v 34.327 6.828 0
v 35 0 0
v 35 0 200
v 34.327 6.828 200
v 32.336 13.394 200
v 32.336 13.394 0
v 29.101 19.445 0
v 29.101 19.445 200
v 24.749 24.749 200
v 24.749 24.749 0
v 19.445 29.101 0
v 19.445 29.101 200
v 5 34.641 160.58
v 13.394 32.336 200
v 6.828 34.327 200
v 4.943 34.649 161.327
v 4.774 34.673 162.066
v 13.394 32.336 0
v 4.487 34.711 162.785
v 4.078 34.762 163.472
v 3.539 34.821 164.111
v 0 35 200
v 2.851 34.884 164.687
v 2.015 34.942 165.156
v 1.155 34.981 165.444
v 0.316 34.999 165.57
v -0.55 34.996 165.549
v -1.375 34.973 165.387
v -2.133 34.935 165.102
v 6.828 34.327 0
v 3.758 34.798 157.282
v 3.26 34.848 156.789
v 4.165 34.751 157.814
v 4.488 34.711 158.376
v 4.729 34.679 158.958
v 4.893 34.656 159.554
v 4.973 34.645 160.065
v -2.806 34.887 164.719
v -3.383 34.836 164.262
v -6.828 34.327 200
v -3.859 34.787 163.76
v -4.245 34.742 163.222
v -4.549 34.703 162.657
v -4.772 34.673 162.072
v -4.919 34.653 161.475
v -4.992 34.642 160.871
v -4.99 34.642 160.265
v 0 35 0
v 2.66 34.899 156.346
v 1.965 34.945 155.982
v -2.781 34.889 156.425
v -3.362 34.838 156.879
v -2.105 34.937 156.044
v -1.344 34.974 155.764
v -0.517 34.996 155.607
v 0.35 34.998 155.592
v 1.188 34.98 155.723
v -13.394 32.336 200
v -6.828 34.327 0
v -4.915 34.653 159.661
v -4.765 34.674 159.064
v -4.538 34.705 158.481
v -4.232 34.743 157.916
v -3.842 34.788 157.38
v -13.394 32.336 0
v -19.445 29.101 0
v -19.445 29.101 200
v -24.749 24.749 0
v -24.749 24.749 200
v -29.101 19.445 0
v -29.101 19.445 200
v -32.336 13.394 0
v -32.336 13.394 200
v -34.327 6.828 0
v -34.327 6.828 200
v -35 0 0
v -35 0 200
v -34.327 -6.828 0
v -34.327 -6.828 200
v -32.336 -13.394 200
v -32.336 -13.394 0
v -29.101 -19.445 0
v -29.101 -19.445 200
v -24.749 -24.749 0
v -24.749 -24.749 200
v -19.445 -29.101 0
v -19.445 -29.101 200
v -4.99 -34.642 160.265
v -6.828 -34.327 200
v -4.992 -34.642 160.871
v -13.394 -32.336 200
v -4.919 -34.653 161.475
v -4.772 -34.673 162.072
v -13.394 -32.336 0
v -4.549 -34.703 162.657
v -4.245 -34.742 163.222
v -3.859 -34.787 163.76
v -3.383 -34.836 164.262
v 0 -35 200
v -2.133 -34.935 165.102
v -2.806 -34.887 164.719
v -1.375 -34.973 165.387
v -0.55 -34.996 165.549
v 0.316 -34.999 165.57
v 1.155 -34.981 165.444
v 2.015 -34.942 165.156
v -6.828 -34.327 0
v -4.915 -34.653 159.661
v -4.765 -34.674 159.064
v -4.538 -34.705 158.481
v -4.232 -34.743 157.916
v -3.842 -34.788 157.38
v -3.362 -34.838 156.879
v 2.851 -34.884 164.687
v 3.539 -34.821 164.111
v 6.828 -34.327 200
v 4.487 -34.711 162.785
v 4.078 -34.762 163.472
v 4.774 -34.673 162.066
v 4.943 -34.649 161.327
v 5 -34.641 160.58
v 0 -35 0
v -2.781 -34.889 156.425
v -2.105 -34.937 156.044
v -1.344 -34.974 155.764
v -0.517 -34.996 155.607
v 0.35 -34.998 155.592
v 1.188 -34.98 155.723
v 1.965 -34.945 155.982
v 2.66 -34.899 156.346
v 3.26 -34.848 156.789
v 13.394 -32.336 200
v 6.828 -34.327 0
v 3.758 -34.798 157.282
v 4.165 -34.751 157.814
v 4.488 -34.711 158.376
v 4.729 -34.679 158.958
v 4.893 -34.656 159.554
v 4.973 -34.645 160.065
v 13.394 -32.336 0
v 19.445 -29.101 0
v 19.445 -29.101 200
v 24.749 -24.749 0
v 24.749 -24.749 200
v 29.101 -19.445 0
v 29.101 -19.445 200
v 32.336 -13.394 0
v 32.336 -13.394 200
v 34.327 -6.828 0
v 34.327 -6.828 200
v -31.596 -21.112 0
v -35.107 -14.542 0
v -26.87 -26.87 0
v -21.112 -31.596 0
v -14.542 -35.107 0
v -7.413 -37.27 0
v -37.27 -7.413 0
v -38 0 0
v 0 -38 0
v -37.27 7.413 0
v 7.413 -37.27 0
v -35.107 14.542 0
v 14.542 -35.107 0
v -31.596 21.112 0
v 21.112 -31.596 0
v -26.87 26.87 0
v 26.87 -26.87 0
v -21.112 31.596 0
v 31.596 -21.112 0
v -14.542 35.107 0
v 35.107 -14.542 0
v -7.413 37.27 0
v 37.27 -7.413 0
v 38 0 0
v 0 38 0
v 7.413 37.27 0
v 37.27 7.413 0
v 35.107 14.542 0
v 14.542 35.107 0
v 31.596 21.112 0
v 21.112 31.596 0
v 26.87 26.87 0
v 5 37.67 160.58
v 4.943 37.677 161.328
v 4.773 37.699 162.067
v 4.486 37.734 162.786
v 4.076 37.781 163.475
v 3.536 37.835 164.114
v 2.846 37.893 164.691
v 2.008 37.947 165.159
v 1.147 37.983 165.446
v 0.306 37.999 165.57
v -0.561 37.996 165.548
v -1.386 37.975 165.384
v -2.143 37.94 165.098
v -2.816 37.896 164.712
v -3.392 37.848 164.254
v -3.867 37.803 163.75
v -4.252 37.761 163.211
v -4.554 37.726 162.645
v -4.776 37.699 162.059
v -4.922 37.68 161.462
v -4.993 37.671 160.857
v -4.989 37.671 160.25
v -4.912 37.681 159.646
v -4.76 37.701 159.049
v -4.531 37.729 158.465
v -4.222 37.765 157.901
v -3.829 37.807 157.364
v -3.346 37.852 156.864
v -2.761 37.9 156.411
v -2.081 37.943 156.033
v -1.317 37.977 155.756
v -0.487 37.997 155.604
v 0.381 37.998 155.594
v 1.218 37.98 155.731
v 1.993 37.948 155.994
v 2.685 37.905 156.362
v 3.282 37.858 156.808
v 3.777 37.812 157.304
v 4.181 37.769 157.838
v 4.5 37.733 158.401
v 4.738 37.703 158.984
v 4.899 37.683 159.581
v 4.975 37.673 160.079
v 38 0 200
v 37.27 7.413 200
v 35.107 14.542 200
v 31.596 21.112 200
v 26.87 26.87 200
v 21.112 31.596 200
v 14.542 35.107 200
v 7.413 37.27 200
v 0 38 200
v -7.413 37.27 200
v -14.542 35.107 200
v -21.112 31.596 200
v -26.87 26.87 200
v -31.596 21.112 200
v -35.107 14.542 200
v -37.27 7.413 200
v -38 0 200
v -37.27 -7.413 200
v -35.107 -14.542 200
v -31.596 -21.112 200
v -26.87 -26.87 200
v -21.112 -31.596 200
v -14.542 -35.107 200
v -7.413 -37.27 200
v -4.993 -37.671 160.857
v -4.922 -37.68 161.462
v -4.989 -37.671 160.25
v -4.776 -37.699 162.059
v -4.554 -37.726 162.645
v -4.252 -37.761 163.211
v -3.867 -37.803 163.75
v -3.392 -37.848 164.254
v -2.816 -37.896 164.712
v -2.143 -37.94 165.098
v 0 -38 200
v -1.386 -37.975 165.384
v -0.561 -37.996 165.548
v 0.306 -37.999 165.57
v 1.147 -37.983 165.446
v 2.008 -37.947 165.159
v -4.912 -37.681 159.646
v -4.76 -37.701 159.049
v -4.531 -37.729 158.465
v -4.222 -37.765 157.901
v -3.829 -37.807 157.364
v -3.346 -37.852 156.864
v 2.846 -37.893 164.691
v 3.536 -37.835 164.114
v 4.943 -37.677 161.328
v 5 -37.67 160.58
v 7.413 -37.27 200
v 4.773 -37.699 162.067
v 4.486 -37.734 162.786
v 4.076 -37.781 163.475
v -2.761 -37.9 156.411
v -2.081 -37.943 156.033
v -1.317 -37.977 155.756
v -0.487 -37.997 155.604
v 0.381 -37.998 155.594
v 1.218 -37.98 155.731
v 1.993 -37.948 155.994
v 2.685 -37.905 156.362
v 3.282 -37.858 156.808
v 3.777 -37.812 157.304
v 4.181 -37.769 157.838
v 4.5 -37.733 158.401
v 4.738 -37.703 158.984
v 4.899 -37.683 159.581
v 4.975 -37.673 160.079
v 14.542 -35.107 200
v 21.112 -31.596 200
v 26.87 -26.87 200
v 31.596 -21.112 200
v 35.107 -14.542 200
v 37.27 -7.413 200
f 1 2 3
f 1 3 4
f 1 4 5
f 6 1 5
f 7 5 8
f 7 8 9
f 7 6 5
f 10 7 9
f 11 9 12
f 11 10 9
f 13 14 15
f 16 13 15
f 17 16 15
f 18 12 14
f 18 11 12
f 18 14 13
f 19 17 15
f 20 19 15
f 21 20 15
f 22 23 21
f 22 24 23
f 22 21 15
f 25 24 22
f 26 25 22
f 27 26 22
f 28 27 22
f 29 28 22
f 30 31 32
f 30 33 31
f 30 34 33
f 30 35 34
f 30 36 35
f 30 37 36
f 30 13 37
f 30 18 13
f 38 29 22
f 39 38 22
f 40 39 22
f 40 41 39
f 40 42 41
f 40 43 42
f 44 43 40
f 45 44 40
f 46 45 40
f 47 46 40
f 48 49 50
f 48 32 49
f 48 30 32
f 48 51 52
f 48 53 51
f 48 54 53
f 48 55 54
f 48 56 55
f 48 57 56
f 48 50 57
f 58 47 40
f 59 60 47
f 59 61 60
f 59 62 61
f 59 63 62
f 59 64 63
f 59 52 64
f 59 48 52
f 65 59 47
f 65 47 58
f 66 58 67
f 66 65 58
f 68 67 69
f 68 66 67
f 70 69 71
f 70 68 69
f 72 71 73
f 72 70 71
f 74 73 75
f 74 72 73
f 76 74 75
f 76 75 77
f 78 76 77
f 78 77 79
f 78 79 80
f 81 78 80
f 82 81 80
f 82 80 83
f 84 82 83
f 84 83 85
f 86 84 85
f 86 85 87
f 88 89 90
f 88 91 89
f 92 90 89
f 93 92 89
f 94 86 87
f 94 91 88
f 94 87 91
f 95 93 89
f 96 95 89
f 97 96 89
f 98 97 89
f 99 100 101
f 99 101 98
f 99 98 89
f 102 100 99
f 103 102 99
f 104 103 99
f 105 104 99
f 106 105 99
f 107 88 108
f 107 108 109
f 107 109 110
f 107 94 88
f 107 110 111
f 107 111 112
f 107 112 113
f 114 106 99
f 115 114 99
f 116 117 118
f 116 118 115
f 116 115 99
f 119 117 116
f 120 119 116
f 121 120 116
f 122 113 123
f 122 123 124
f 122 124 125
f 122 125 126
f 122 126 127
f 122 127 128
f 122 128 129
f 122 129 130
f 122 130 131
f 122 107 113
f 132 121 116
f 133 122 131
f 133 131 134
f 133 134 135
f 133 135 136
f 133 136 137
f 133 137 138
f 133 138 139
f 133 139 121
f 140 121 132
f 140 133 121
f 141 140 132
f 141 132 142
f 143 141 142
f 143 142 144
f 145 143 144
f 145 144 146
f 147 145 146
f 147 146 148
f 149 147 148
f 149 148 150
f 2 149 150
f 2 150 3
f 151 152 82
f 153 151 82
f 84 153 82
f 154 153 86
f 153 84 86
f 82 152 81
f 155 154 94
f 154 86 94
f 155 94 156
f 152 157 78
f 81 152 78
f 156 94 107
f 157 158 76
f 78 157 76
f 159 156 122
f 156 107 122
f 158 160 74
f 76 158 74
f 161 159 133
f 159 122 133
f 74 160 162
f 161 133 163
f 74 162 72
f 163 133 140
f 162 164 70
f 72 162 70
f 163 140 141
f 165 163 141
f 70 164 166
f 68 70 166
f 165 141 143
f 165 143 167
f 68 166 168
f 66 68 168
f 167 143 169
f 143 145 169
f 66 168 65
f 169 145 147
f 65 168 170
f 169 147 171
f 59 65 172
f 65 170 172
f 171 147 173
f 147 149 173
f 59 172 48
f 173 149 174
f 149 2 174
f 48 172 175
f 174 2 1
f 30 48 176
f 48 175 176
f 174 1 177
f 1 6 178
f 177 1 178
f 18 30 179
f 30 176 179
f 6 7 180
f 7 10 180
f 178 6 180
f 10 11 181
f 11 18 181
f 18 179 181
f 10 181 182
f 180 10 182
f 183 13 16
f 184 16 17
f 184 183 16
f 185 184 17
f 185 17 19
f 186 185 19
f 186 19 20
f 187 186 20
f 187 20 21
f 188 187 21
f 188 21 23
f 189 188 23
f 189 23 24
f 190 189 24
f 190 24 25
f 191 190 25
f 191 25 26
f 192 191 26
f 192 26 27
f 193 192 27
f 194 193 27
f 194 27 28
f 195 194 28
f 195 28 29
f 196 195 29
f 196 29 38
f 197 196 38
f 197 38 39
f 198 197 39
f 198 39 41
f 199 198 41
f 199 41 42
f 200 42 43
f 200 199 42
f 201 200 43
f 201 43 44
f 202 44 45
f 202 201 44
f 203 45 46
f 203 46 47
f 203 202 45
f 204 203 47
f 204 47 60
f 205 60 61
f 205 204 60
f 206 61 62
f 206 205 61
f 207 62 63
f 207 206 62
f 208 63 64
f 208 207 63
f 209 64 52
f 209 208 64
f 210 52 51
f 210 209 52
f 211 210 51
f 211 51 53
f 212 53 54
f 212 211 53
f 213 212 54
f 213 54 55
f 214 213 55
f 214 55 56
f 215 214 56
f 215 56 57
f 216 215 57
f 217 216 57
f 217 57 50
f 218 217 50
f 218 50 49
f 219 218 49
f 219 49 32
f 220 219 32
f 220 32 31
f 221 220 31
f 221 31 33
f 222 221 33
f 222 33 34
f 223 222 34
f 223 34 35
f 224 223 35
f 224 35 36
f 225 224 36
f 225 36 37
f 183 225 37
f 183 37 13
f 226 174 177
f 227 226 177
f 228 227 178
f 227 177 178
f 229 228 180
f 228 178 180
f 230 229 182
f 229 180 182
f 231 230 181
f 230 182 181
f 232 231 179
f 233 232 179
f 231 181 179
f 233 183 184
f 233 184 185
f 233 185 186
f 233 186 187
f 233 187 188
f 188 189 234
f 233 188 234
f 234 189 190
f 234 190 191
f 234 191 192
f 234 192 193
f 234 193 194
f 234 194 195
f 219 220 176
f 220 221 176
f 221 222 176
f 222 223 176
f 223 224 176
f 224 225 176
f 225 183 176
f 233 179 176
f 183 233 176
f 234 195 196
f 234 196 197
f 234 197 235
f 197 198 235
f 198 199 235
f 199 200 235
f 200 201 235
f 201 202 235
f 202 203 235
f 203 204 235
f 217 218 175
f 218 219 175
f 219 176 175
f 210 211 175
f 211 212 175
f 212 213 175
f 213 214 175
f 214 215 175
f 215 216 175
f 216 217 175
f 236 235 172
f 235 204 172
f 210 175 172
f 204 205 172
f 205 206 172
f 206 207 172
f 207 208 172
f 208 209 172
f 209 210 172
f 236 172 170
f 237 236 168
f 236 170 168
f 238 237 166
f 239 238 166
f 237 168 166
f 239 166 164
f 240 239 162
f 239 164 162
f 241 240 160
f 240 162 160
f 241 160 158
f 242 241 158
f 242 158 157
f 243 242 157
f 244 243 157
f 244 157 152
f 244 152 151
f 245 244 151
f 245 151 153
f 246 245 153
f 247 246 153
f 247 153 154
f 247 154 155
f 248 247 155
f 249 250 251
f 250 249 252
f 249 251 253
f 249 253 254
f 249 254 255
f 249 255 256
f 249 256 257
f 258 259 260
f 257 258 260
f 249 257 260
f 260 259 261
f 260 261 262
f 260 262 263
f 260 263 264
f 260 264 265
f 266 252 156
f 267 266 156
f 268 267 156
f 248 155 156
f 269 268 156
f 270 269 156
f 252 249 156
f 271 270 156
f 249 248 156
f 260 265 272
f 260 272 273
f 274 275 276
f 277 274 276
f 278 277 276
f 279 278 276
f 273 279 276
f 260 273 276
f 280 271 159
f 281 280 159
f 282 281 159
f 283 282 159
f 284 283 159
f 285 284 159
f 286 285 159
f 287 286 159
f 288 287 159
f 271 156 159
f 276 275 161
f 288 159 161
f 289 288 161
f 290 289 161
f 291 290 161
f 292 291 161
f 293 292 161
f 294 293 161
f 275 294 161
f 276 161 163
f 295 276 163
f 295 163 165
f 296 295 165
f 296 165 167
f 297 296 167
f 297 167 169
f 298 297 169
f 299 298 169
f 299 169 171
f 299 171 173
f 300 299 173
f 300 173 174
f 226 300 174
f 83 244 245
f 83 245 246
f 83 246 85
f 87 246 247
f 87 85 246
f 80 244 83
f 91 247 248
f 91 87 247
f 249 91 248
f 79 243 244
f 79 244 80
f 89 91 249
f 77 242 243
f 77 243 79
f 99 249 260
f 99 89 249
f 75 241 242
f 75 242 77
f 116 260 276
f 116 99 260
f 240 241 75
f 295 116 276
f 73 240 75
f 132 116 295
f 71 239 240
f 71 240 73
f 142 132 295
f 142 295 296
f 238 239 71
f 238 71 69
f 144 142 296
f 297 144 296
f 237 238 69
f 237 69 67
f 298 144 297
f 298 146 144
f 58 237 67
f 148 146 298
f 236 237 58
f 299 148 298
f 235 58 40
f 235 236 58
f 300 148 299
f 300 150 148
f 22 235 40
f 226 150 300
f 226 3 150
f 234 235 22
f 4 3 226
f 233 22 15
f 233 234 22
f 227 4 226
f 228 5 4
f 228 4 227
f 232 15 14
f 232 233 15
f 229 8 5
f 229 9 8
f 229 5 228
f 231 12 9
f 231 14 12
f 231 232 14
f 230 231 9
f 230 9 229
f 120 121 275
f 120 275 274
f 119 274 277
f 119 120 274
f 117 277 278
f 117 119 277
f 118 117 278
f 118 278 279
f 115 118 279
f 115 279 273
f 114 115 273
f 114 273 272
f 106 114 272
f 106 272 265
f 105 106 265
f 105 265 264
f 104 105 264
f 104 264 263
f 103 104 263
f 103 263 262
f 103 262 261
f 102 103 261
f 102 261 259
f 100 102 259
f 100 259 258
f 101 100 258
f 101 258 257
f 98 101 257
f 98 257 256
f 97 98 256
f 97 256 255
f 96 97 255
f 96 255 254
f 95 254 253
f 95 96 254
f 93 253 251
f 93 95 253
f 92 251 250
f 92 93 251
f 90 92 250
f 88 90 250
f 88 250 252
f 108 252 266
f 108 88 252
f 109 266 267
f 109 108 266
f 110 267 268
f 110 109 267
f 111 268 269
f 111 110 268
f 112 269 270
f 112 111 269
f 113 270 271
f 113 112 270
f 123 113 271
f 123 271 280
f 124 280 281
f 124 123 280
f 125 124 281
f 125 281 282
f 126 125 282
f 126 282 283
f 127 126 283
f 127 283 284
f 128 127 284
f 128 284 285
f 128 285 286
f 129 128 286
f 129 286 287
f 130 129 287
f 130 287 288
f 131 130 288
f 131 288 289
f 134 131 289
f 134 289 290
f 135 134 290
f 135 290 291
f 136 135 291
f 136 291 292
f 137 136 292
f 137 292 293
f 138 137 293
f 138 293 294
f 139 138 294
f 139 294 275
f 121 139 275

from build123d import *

# Parameters (mm, degrees)
F0_R     = 38
F0_R_2   = 35
F1_DEPTH = 200
F2_R     = 5
F3_DEPTH = 125


with BuildPart() as f1:
    # F0 (on Top) → F1 (new body)
    with BuildSketch(Plane.XY):
        Circle(F0_R)
        Circle(F0_R_2, mode=Mode.SUBTRACT)
    extrude(amount=F1_DEPTH)


with BuildPart() as f3:
    # F2 (on Front) → F3 (new body)
    with BuildSketch(Plane.XZ):
        with Locations((-62.210366, -16.730187)):
            Circle(F2_R)
    extrude(amount=F3_DEPTH)


with BuildPart() as f3_1:
    # F4: moved
    add(f3.part.moved(Location((62.21, 60.4497, 177.31))))


with BuildPart() as f1_1:
    add(f1.part)

    # F5: cut F3
    add(f3_1.part, mode=Mode.SUBTRACT)


solid = f1_1.part
